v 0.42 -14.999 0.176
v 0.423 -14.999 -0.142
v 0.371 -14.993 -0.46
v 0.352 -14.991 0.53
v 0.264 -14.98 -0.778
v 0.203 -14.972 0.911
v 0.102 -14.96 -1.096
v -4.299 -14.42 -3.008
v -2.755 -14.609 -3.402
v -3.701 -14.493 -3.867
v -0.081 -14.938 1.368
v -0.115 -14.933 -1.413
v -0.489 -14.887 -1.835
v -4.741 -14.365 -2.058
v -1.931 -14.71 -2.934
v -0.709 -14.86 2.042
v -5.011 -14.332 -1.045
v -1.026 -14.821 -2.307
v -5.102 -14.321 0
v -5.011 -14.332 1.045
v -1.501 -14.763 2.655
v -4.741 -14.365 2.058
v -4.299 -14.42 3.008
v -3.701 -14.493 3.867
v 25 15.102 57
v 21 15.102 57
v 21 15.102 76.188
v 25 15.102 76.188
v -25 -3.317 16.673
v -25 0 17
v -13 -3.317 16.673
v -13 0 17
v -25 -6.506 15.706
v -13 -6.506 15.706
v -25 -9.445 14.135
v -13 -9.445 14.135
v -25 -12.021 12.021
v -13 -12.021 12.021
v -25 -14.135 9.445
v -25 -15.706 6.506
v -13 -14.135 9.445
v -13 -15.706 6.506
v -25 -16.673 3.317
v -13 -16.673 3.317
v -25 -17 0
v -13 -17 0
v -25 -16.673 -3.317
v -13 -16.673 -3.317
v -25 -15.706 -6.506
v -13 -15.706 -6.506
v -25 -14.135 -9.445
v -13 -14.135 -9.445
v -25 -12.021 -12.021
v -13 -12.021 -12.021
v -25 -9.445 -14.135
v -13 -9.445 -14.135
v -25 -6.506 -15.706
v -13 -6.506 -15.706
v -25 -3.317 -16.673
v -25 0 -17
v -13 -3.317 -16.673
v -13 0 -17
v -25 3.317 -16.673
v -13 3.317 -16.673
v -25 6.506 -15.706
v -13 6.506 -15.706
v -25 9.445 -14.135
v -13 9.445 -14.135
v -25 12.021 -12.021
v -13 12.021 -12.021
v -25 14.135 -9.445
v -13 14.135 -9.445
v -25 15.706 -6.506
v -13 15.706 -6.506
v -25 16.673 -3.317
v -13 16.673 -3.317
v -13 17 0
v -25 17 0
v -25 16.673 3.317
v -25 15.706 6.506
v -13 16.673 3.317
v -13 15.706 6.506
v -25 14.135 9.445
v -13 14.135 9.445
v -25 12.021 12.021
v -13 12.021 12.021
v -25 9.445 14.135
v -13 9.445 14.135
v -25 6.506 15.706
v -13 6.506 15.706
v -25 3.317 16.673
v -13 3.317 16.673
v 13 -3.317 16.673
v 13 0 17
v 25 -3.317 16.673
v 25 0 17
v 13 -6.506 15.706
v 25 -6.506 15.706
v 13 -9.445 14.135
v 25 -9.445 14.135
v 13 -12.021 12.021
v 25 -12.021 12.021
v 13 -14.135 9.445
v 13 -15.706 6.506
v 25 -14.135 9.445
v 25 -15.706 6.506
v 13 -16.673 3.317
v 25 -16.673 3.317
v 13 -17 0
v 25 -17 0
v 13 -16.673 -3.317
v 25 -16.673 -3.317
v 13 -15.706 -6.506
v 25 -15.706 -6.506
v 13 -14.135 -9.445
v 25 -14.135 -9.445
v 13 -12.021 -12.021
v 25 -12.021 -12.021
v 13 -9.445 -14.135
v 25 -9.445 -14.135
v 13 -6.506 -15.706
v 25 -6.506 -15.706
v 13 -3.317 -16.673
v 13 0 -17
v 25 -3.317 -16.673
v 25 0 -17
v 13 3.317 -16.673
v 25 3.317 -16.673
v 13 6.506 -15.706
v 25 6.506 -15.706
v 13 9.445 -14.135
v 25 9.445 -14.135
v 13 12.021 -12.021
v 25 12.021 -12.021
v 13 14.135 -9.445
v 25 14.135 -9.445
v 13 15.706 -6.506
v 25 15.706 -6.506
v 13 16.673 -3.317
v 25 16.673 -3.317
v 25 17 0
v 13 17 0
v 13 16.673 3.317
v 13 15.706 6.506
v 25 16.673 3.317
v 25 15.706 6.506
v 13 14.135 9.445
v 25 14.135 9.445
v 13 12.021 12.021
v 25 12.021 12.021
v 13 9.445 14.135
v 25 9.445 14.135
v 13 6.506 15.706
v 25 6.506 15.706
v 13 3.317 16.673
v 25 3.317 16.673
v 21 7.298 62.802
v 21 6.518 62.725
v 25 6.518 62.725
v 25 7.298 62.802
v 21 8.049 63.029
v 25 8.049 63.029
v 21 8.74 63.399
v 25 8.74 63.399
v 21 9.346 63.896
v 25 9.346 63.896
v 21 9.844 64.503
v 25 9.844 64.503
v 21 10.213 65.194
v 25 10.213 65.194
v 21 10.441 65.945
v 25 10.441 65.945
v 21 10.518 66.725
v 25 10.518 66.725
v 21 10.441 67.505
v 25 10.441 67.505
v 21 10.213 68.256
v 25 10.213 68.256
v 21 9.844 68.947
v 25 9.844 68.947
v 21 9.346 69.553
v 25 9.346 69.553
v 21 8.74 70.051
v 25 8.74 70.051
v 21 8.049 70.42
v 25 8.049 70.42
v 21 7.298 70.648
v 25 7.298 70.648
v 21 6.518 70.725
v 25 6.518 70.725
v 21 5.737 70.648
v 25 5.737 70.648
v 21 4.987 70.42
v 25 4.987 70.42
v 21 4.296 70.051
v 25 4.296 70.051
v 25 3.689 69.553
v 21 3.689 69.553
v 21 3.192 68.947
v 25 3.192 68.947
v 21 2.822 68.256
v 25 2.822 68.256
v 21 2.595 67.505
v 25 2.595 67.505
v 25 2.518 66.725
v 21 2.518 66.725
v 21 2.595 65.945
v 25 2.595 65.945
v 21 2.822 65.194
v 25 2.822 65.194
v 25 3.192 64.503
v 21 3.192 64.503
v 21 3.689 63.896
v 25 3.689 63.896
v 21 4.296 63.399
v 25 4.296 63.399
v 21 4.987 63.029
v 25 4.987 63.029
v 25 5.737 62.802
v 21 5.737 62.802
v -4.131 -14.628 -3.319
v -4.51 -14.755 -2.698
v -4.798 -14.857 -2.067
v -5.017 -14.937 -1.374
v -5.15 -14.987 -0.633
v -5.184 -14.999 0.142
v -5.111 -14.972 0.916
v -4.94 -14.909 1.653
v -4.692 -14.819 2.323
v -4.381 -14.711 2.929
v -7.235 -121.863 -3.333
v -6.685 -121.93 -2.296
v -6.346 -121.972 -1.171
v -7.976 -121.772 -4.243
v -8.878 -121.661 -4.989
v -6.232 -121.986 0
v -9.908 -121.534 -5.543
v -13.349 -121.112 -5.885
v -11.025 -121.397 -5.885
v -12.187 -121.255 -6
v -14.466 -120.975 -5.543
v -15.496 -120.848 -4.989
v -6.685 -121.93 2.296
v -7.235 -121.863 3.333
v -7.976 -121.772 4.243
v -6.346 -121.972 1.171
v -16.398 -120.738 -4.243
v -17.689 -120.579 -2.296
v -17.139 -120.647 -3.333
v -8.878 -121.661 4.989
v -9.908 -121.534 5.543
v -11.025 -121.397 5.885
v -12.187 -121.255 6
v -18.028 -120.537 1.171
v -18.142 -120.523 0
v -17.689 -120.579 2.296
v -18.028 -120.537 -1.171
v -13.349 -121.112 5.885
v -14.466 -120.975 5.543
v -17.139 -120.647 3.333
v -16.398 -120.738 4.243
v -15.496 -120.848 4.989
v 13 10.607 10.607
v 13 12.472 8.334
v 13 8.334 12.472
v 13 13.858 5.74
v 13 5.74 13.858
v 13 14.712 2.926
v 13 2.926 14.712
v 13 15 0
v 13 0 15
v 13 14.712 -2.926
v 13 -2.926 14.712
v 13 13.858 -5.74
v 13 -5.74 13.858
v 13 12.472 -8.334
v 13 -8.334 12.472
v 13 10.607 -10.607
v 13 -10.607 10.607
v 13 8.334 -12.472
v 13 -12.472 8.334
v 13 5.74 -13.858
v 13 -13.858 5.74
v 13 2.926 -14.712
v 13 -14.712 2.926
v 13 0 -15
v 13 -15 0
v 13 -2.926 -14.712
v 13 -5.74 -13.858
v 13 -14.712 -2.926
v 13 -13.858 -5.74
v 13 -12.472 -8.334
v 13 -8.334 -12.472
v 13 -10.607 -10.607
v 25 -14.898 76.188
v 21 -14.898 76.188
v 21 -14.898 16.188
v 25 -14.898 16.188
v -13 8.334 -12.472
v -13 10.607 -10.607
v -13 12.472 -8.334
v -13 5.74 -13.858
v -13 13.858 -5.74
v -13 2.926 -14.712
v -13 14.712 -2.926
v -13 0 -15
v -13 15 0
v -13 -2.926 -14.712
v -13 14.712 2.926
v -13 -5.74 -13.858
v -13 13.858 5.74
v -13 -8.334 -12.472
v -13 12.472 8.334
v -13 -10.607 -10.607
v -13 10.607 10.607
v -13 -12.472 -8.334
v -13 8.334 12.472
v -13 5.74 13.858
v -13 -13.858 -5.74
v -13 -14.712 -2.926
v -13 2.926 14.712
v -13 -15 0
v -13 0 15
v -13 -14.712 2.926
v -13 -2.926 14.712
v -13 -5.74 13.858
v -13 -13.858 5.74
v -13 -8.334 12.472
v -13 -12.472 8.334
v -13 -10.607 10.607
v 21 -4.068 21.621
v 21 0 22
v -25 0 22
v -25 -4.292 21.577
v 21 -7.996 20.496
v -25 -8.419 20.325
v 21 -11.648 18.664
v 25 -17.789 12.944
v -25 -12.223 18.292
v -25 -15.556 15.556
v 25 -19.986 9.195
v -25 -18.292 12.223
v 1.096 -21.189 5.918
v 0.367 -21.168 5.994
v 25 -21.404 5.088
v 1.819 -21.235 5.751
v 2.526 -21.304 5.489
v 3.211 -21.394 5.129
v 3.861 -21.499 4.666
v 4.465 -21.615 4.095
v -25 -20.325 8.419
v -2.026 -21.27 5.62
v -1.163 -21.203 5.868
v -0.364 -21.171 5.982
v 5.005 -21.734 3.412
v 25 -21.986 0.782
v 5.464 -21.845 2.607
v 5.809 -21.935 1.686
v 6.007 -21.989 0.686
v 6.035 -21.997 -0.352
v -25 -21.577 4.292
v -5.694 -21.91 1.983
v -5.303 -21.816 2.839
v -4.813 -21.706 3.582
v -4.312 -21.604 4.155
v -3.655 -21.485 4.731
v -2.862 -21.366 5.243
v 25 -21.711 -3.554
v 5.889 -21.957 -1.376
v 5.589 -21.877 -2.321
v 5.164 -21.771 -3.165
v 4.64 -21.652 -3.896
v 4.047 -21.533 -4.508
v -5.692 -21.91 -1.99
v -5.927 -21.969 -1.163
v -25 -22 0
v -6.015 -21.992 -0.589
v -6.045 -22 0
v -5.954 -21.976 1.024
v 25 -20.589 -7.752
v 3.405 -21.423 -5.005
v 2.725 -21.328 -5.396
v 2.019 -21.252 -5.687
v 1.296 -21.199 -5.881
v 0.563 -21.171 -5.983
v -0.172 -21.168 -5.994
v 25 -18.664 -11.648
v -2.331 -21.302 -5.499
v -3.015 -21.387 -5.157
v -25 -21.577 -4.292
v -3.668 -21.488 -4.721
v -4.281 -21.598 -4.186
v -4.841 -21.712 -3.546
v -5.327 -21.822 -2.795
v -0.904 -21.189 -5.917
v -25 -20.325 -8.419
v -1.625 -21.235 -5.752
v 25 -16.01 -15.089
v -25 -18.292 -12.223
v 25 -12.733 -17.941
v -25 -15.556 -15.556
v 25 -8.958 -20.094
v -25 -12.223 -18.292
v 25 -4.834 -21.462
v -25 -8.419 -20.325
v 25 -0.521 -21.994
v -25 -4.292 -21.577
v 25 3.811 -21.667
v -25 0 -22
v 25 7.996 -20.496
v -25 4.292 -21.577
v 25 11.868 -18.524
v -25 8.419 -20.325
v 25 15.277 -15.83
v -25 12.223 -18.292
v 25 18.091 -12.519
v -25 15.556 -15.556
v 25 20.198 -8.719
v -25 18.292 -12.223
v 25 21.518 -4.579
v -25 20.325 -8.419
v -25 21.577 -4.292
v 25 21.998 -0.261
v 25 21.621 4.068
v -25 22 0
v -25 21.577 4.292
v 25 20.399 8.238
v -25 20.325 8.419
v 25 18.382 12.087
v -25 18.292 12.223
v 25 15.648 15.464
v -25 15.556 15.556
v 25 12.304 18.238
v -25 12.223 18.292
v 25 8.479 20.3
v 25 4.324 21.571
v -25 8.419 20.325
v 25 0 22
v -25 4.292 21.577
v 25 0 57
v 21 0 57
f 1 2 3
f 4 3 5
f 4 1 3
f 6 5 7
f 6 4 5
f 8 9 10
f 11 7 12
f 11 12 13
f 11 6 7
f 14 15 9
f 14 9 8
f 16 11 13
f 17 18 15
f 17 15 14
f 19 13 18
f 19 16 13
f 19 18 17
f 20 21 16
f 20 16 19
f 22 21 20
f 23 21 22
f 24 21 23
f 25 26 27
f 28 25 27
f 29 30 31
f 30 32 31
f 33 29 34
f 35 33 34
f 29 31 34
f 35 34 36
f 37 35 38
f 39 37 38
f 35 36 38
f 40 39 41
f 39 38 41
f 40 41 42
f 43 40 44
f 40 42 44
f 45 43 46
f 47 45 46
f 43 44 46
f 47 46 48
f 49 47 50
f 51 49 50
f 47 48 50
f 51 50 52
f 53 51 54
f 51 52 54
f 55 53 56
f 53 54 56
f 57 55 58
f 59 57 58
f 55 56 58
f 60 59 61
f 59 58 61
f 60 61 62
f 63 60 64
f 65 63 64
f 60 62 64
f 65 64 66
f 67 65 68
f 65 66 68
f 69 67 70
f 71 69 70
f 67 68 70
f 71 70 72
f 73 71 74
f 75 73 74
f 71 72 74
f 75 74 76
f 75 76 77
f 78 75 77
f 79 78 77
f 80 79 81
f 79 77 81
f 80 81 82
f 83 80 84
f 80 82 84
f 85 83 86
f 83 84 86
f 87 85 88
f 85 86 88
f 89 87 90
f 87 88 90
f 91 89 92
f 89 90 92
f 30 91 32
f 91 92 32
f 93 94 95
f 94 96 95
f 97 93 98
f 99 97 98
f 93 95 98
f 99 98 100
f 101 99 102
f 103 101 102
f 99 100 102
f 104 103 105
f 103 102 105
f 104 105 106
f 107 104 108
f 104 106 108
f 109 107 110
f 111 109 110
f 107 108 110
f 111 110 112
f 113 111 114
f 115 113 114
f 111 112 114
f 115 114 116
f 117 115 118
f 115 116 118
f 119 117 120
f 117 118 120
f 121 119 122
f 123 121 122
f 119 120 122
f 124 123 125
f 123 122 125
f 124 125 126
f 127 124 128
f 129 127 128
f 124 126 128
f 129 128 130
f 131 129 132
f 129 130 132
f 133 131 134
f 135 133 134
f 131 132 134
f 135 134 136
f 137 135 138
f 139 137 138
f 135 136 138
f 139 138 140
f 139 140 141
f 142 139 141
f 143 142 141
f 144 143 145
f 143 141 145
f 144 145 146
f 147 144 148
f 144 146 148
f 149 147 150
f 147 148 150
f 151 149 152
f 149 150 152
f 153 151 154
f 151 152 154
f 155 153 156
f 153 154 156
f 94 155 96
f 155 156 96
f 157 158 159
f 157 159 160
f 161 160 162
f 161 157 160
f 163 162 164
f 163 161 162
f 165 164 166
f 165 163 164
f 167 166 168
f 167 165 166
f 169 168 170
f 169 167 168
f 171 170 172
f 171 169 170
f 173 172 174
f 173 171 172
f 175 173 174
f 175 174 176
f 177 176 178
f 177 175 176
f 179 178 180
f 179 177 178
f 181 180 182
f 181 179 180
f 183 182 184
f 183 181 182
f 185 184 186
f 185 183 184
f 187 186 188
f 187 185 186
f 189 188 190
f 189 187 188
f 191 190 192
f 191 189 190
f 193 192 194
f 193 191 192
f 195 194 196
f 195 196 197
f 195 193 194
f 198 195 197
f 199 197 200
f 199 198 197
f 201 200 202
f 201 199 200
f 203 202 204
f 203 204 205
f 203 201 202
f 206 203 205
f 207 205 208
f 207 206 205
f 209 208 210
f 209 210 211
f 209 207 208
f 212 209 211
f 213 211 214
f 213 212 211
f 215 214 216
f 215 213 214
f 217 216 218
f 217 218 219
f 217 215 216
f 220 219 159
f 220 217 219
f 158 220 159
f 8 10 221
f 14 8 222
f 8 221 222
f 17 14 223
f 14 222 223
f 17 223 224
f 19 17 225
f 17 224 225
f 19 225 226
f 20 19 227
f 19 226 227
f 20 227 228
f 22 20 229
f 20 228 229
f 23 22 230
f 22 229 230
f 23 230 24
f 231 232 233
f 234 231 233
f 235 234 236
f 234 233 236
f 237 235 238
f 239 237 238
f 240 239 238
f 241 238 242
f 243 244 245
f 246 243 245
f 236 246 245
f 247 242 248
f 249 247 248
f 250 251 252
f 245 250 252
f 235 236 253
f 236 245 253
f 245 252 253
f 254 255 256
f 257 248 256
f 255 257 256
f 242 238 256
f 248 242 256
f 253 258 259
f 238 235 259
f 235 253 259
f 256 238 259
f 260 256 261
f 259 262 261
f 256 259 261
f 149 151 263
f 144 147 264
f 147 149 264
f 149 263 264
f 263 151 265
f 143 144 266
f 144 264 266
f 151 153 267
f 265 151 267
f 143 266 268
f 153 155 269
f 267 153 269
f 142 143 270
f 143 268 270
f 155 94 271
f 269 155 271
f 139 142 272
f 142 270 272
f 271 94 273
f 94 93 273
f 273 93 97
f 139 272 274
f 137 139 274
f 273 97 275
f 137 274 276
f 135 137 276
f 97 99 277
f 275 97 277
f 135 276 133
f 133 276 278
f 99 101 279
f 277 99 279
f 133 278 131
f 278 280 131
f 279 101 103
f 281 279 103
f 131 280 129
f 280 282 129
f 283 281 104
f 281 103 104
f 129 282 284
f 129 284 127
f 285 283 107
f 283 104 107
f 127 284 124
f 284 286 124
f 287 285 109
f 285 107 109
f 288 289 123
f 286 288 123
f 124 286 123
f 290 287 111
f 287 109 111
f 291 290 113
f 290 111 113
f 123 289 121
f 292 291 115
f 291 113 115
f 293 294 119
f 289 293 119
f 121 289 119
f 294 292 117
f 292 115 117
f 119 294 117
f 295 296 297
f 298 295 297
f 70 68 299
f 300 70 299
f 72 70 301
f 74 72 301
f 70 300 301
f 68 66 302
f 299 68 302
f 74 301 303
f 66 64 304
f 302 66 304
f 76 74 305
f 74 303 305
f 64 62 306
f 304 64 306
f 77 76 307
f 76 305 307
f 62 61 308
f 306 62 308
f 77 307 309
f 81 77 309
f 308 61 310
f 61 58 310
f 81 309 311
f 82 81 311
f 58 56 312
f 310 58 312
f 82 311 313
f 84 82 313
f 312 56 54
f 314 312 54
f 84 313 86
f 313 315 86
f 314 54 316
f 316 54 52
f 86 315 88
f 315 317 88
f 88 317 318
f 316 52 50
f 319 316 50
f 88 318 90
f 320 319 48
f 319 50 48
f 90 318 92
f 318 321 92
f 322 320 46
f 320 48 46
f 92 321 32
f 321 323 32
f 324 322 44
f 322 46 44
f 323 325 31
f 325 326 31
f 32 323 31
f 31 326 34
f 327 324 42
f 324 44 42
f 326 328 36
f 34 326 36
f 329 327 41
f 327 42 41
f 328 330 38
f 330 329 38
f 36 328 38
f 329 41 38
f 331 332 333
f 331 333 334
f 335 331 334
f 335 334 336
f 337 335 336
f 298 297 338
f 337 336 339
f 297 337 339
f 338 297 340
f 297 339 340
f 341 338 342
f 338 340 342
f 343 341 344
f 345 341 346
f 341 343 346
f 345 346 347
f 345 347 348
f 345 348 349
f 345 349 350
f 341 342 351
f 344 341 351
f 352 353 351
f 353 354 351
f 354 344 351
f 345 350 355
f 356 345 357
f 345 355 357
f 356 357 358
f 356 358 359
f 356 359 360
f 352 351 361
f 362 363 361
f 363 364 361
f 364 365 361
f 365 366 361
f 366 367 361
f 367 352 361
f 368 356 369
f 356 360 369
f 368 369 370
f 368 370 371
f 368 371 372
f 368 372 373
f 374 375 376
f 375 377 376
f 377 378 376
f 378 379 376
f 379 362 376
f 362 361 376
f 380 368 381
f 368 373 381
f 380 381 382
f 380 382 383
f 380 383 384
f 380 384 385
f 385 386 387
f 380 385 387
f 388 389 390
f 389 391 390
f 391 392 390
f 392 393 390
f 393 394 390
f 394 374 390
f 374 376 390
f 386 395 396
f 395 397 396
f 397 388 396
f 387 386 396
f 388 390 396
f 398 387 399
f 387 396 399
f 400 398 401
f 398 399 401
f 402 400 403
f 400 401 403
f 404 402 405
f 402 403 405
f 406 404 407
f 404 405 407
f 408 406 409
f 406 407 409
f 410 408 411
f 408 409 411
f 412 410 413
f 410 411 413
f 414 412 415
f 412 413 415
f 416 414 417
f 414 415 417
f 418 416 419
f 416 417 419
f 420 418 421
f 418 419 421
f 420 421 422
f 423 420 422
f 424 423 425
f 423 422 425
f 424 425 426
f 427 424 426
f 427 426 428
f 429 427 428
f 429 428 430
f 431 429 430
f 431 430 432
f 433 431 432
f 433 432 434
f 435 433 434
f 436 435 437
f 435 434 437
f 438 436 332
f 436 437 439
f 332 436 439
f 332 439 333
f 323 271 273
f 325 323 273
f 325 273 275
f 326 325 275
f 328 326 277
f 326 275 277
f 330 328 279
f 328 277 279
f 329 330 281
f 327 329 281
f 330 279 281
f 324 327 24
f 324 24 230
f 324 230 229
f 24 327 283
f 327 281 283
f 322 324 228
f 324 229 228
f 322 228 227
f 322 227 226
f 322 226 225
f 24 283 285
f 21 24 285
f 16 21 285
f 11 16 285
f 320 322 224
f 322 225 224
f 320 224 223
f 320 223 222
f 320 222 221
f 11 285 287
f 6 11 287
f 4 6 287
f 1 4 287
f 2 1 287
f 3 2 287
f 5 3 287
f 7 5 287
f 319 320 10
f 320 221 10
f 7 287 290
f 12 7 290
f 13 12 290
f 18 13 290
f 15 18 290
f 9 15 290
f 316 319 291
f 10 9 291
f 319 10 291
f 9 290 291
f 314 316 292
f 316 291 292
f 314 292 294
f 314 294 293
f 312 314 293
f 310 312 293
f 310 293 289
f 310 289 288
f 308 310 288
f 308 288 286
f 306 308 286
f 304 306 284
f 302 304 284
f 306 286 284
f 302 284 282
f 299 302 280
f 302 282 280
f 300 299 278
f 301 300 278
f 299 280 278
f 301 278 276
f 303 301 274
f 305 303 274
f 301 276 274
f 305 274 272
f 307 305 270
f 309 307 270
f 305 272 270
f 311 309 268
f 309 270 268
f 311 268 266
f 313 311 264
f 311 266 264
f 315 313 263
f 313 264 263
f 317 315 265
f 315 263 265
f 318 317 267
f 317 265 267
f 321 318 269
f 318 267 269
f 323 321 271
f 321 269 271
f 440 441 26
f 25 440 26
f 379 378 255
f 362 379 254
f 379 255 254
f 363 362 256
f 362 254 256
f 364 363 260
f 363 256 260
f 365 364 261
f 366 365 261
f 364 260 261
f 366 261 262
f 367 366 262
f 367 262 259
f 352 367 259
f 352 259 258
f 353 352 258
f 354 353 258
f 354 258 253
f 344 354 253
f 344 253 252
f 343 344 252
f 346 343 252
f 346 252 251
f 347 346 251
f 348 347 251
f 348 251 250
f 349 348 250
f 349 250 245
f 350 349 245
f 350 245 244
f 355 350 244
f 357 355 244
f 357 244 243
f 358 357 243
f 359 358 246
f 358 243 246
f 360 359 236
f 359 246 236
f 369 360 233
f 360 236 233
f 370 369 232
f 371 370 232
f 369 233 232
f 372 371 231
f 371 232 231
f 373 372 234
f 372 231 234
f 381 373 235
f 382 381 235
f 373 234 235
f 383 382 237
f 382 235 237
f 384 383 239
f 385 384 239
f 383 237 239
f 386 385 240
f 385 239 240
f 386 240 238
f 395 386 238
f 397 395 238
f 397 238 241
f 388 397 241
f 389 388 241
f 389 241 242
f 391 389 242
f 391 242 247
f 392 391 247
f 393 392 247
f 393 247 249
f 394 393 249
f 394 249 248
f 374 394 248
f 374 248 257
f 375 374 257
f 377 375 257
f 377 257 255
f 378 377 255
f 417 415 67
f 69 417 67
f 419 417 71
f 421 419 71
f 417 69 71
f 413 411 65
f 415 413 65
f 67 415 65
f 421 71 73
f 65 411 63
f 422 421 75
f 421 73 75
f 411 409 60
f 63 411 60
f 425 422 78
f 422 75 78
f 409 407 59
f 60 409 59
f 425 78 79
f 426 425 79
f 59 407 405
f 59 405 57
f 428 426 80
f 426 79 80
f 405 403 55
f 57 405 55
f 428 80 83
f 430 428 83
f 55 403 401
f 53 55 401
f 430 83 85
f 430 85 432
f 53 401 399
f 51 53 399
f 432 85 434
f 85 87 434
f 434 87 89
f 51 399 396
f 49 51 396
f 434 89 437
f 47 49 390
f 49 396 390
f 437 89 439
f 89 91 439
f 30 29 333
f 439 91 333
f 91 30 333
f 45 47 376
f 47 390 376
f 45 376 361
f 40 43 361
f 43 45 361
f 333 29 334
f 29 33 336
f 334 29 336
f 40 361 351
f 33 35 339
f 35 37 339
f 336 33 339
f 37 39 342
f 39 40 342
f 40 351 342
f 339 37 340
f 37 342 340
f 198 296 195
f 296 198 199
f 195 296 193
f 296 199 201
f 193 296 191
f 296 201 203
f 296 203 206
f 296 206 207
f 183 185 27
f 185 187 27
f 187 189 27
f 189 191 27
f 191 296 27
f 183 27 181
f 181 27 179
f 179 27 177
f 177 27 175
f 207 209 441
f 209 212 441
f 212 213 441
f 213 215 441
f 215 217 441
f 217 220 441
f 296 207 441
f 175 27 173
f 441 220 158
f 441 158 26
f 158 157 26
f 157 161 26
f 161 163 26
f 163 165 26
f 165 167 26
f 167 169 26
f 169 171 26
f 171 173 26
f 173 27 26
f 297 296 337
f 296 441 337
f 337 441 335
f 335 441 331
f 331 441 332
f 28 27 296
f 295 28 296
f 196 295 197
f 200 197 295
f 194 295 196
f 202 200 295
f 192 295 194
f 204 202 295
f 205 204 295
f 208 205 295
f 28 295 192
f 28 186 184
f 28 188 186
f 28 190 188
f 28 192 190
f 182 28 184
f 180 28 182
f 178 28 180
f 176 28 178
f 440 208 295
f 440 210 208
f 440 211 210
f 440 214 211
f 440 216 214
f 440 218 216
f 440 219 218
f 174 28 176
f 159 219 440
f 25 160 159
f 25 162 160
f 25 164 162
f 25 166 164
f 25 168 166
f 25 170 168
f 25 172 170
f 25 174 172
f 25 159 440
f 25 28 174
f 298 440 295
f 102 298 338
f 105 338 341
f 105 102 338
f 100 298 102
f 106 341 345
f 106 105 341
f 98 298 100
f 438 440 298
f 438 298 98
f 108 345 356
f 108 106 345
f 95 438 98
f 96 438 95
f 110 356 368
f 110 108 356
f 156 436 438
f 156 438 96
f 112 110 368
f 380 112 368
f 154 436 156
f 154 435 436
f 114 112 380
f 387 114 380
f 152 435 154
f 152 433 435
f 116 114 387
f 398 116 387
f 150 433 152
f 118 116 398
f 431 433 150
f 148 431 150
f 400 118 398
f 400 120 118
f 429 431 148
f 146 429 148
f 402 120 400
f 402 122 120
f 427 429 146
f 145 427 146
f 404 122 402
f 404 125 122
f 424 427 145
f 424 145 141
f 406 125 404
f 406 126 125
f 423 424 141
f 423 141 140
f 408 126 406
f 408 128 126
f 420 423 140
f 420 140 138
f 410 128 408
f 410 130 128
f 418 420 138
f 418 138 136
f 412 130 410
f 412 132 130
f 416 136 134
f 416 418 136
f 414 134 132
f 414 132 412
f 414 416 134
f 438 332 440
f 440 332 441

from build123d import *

# Parameters (mm, degrees)
BOSS_EXTRUDE1_START      = -4
SKETCH8_R                = 4
BOSS_EXTRUDE1_DEPTH      = 4
BOSS_EXTRUDE2_DEPTH      = 7
BOSS_EXTRUDE2_DEPTH_BACK = 100
SKETCH7_2_R              = 6


with BuildPart() as part:
    # Sketch1 → Revolve1 (revolve)
    with BuildSketch(Plane.XY):
        Polygon((-25, 22), (-25, 17), (-13, 17), (-13, 15), (13, 15), (13, 17), (25, 17), (25, 22), align=None)
    revolve(axis=Axis((-45.766103365, 0, 0), (1, 0, 0)))

    # Sketch8 → Boss-Extrude1 (add)
    with BuildSketch(Plane(origin=(25, 0, 0), x_dir=(0, 0, -1), z_dir=(1, 0, 0)).offset(BOSS_EXTRUDE1_START)):
        with BuildLine():
            Line((-22, 0), (-57, 0))
            Line((-57, 0), (-57, 15.102123796))
            Line((-57, 15.102123796), (-76.188059939, 15.102123796))
            Line((-76.188059939, 15.102123796), (-76.188059939, -14.897876204))
            Line((-76.188059939, -14.897876204), (-16.188059939, -14.897876204))
            ThreePointArc((-16.188059939, -14.897876204), (-20.49557658, -7.99570764), (-22, 0))
        make_face()
        with Locations((-66.724926484, 6.517856695)):
            Circle(SKETCH8_R, mode=Mode.SUBTRACT)
    extrude(amount=BOSS_EXTRUDE1_DEPTH)

    # Sketch7<2> → Boss-Extrude2 (add, two sides: drawn at the far end of the back side and taken through both)
    with BuildSketch(Plane(origin=(-2.661140852, -21.673252989, 0), x_dir=(0, 0, -1), z_dir=(0.1218693434051474, 0.9925461516413221, 0)).offset(-BOSS_EXTRUDE2_DEPTH_BACK)):
        with Locations((0, -2.681125555)):
            Circle(SKETCH7_2_R)
    extrude(amount=BOSS_EXTRUDE2_DEPTH + BOSS_EXTRUDE2_DEPTH_BACK)


solid = part.part
